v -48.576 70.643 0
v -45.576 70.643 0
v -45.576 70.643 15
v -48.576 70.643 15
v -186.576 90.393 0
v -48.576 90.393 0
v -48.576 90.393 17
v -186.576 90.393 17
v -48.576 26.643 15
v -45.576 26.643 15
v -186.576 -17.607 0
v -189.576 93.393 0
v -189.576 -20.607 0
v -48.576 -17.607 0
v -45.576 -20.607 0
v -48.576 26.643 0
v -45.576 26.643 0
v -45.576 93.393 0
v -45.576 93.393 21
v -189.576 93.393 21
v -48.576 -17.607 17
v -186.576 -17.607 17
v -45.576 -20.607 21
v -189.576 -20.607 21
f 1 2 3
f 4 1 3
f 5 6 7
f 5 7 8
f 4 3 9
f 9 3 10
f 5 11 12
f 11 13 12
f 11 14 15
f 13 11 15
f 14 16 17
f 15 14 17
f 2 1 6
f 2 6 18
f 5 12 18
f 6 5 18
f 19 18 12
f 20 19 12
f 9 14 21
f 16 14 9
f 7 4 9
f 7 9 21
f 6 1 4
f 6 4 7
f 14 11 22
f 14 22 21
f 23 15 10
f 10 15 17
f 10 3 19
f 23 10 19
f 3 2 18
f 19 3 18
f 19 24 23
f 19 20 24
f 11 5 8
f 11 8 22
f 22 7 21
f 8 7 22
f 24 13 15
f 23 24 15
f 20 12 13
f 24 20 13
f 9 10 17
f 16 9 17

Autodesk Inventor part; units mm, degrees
ref_plane "YZ Plane" through (0, 0, 0) normal (1, 0, 0) x (0, 1, 0)
ref_plane "XZ Plane" through (0, 0, 0) normal (0, 1, 0) x (-1, 0, 0)
sketch "Esquisse1" plane through (0, 0, 0) normal (0, 0, 1) x (1, 0, 0)
  line L0 (-45.5759, 93.3928) -> (-189.5759, 93.3928) projected
  line L1 (-189.5759, 93.3928) -> (-189.5759, -20.6072) projected
  line L2 (-45.5759, -20.6072) -> (-45.5759, 93.3928) projected
  line L3 (-189.5759, -20.6072) -> (-45.5759, -20.6072) projected
  line L4 (-189.5759, 93.3928) -> (-45.5759, 93.3928)
  line L5 (-45.5759, 93.3928) -> (-45.5759, -20.6072)
  line L6 (-45.5759, -20.6072) -> (-189.5759, -20.6072)
  line L7 (-189.5759, -20.6072) -> (-189.5759, 93.3928)
  point P0 (0, 0)
extrude "Extrusion1" add sketch "Esquisse1" along normal blind 21
sketch "Esquisse2" plane through (0, 0, 0) normal (0, 0, -1) x (-1, 0, 0)
  line L0 (186.5759, -17.6072) -> (48.5759, -17.6072)
  line L1 (48.5759, -17.6072) -> (48.5759, 90.3928)
  line L2 (48.5759, 90.3928) -> (186.5759, 90.3928)
  line L3 (186.5759, 90.3928) -> (186.5759, -17.6072)
  line L4 (189.5759, -20.6072) -> (45.5759, -20.6072) projected
  line L5 (45.5759, 93.3928) -> (189.5759, 93.3928) projected
  line L6 (189.5759, 93.3928) -> (189.5759, -20.6072) projected
  line L7 (45.5759, -20.6072) -> (45.5759, 93.3928) projected
  point P0 (0, 0)
  dimension "d2" = 3
  dimension "d4" = 3
  dimension "d5" = 3
  dimension "d6" = 3
extrude "Extrusion3" cut sketch "Esquisse2" against normal blind 17 contours L0 L1 L2 L3
sketch "Esquisse3" plane through (-45.5759, -20.6072, 0) normal (1, 0, 0) x (0, 0, -1)
  line L0 (-15, 47.25) -> (0, 47.25)
  line L1 (0, 47.25) -> (0, 91.25)
  line L2 (0, 91.25) -> (-15, 91.25)
  line L3 (-15, 91.25) -> (-15, 47.25)
  line L4 (0, -22.8) -> (0, 136.8) projected
  line L5 (0, 0) -> (-21, 0) projected
  point P0 (0, 20.6072)
  point P1 (-10.5, -7.9486)
  point P2 (-10.5, 0)
  dimension "d11" = 15
  dimension "d12" = 44
  dimension "d19" = 47.25
ref_plane "Plan de construction1" through (-50.5759, 25.8928, -3.5) normal (-1, 0, 0) x (0, 0, 1)
extrude "Extrusion4" cut sketch "Esquisse3" against normal up to surface (5 mm away)
equation "\"d4\" = d2"
equation "\"d5\" = d2"
equation "\"d6\" = d4"
properties part number "couvercle"
